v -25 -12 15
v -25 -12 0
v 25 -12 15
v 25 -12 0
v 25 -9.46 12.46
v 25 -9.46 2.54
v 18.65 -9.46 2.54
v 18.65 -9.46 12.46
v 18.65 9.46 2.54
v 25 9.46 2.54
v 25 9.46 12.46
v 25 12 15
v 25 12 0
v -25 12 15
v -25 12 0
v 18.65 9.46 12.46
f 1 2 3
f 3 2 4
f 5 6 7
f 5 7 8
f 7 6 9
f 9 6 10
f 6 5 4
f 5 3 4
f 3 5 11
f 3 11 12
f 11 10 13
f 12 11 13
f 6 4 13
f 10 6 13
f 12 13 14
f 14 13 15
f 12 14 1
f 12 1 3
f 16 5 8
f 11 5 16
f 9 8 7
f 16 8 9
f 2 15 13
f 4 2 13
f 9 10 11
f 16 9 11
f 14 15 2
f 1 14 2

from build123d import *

# Parameters (mm, degrees)
F1_DEPTH = 15
F2_W     = 18.92
F2_H     = 9.92
F3_DEPTH = 6.35


with BuildPart() as f1:
    # F0 (on Top) → F1 (new body)
    with BuildSketch(Plane.XY):
        Polygon((-25, 12), (-25, 0), (-25, -12), (25, -12), (25, 0), (25, 12), align=None)
    extrude(amount=F1_DEPTH)

    # F2 (on face) → F3 (cut)
    with BuildSketch(Plane.YZ.offset(25)):
        with Locations((0, 7.5)):
            Rectangle(F2_W, F2_H)
    extrude(amount=-F3_DEPTH, mode=Mode.SUBTRACT)


solid = f1.part
